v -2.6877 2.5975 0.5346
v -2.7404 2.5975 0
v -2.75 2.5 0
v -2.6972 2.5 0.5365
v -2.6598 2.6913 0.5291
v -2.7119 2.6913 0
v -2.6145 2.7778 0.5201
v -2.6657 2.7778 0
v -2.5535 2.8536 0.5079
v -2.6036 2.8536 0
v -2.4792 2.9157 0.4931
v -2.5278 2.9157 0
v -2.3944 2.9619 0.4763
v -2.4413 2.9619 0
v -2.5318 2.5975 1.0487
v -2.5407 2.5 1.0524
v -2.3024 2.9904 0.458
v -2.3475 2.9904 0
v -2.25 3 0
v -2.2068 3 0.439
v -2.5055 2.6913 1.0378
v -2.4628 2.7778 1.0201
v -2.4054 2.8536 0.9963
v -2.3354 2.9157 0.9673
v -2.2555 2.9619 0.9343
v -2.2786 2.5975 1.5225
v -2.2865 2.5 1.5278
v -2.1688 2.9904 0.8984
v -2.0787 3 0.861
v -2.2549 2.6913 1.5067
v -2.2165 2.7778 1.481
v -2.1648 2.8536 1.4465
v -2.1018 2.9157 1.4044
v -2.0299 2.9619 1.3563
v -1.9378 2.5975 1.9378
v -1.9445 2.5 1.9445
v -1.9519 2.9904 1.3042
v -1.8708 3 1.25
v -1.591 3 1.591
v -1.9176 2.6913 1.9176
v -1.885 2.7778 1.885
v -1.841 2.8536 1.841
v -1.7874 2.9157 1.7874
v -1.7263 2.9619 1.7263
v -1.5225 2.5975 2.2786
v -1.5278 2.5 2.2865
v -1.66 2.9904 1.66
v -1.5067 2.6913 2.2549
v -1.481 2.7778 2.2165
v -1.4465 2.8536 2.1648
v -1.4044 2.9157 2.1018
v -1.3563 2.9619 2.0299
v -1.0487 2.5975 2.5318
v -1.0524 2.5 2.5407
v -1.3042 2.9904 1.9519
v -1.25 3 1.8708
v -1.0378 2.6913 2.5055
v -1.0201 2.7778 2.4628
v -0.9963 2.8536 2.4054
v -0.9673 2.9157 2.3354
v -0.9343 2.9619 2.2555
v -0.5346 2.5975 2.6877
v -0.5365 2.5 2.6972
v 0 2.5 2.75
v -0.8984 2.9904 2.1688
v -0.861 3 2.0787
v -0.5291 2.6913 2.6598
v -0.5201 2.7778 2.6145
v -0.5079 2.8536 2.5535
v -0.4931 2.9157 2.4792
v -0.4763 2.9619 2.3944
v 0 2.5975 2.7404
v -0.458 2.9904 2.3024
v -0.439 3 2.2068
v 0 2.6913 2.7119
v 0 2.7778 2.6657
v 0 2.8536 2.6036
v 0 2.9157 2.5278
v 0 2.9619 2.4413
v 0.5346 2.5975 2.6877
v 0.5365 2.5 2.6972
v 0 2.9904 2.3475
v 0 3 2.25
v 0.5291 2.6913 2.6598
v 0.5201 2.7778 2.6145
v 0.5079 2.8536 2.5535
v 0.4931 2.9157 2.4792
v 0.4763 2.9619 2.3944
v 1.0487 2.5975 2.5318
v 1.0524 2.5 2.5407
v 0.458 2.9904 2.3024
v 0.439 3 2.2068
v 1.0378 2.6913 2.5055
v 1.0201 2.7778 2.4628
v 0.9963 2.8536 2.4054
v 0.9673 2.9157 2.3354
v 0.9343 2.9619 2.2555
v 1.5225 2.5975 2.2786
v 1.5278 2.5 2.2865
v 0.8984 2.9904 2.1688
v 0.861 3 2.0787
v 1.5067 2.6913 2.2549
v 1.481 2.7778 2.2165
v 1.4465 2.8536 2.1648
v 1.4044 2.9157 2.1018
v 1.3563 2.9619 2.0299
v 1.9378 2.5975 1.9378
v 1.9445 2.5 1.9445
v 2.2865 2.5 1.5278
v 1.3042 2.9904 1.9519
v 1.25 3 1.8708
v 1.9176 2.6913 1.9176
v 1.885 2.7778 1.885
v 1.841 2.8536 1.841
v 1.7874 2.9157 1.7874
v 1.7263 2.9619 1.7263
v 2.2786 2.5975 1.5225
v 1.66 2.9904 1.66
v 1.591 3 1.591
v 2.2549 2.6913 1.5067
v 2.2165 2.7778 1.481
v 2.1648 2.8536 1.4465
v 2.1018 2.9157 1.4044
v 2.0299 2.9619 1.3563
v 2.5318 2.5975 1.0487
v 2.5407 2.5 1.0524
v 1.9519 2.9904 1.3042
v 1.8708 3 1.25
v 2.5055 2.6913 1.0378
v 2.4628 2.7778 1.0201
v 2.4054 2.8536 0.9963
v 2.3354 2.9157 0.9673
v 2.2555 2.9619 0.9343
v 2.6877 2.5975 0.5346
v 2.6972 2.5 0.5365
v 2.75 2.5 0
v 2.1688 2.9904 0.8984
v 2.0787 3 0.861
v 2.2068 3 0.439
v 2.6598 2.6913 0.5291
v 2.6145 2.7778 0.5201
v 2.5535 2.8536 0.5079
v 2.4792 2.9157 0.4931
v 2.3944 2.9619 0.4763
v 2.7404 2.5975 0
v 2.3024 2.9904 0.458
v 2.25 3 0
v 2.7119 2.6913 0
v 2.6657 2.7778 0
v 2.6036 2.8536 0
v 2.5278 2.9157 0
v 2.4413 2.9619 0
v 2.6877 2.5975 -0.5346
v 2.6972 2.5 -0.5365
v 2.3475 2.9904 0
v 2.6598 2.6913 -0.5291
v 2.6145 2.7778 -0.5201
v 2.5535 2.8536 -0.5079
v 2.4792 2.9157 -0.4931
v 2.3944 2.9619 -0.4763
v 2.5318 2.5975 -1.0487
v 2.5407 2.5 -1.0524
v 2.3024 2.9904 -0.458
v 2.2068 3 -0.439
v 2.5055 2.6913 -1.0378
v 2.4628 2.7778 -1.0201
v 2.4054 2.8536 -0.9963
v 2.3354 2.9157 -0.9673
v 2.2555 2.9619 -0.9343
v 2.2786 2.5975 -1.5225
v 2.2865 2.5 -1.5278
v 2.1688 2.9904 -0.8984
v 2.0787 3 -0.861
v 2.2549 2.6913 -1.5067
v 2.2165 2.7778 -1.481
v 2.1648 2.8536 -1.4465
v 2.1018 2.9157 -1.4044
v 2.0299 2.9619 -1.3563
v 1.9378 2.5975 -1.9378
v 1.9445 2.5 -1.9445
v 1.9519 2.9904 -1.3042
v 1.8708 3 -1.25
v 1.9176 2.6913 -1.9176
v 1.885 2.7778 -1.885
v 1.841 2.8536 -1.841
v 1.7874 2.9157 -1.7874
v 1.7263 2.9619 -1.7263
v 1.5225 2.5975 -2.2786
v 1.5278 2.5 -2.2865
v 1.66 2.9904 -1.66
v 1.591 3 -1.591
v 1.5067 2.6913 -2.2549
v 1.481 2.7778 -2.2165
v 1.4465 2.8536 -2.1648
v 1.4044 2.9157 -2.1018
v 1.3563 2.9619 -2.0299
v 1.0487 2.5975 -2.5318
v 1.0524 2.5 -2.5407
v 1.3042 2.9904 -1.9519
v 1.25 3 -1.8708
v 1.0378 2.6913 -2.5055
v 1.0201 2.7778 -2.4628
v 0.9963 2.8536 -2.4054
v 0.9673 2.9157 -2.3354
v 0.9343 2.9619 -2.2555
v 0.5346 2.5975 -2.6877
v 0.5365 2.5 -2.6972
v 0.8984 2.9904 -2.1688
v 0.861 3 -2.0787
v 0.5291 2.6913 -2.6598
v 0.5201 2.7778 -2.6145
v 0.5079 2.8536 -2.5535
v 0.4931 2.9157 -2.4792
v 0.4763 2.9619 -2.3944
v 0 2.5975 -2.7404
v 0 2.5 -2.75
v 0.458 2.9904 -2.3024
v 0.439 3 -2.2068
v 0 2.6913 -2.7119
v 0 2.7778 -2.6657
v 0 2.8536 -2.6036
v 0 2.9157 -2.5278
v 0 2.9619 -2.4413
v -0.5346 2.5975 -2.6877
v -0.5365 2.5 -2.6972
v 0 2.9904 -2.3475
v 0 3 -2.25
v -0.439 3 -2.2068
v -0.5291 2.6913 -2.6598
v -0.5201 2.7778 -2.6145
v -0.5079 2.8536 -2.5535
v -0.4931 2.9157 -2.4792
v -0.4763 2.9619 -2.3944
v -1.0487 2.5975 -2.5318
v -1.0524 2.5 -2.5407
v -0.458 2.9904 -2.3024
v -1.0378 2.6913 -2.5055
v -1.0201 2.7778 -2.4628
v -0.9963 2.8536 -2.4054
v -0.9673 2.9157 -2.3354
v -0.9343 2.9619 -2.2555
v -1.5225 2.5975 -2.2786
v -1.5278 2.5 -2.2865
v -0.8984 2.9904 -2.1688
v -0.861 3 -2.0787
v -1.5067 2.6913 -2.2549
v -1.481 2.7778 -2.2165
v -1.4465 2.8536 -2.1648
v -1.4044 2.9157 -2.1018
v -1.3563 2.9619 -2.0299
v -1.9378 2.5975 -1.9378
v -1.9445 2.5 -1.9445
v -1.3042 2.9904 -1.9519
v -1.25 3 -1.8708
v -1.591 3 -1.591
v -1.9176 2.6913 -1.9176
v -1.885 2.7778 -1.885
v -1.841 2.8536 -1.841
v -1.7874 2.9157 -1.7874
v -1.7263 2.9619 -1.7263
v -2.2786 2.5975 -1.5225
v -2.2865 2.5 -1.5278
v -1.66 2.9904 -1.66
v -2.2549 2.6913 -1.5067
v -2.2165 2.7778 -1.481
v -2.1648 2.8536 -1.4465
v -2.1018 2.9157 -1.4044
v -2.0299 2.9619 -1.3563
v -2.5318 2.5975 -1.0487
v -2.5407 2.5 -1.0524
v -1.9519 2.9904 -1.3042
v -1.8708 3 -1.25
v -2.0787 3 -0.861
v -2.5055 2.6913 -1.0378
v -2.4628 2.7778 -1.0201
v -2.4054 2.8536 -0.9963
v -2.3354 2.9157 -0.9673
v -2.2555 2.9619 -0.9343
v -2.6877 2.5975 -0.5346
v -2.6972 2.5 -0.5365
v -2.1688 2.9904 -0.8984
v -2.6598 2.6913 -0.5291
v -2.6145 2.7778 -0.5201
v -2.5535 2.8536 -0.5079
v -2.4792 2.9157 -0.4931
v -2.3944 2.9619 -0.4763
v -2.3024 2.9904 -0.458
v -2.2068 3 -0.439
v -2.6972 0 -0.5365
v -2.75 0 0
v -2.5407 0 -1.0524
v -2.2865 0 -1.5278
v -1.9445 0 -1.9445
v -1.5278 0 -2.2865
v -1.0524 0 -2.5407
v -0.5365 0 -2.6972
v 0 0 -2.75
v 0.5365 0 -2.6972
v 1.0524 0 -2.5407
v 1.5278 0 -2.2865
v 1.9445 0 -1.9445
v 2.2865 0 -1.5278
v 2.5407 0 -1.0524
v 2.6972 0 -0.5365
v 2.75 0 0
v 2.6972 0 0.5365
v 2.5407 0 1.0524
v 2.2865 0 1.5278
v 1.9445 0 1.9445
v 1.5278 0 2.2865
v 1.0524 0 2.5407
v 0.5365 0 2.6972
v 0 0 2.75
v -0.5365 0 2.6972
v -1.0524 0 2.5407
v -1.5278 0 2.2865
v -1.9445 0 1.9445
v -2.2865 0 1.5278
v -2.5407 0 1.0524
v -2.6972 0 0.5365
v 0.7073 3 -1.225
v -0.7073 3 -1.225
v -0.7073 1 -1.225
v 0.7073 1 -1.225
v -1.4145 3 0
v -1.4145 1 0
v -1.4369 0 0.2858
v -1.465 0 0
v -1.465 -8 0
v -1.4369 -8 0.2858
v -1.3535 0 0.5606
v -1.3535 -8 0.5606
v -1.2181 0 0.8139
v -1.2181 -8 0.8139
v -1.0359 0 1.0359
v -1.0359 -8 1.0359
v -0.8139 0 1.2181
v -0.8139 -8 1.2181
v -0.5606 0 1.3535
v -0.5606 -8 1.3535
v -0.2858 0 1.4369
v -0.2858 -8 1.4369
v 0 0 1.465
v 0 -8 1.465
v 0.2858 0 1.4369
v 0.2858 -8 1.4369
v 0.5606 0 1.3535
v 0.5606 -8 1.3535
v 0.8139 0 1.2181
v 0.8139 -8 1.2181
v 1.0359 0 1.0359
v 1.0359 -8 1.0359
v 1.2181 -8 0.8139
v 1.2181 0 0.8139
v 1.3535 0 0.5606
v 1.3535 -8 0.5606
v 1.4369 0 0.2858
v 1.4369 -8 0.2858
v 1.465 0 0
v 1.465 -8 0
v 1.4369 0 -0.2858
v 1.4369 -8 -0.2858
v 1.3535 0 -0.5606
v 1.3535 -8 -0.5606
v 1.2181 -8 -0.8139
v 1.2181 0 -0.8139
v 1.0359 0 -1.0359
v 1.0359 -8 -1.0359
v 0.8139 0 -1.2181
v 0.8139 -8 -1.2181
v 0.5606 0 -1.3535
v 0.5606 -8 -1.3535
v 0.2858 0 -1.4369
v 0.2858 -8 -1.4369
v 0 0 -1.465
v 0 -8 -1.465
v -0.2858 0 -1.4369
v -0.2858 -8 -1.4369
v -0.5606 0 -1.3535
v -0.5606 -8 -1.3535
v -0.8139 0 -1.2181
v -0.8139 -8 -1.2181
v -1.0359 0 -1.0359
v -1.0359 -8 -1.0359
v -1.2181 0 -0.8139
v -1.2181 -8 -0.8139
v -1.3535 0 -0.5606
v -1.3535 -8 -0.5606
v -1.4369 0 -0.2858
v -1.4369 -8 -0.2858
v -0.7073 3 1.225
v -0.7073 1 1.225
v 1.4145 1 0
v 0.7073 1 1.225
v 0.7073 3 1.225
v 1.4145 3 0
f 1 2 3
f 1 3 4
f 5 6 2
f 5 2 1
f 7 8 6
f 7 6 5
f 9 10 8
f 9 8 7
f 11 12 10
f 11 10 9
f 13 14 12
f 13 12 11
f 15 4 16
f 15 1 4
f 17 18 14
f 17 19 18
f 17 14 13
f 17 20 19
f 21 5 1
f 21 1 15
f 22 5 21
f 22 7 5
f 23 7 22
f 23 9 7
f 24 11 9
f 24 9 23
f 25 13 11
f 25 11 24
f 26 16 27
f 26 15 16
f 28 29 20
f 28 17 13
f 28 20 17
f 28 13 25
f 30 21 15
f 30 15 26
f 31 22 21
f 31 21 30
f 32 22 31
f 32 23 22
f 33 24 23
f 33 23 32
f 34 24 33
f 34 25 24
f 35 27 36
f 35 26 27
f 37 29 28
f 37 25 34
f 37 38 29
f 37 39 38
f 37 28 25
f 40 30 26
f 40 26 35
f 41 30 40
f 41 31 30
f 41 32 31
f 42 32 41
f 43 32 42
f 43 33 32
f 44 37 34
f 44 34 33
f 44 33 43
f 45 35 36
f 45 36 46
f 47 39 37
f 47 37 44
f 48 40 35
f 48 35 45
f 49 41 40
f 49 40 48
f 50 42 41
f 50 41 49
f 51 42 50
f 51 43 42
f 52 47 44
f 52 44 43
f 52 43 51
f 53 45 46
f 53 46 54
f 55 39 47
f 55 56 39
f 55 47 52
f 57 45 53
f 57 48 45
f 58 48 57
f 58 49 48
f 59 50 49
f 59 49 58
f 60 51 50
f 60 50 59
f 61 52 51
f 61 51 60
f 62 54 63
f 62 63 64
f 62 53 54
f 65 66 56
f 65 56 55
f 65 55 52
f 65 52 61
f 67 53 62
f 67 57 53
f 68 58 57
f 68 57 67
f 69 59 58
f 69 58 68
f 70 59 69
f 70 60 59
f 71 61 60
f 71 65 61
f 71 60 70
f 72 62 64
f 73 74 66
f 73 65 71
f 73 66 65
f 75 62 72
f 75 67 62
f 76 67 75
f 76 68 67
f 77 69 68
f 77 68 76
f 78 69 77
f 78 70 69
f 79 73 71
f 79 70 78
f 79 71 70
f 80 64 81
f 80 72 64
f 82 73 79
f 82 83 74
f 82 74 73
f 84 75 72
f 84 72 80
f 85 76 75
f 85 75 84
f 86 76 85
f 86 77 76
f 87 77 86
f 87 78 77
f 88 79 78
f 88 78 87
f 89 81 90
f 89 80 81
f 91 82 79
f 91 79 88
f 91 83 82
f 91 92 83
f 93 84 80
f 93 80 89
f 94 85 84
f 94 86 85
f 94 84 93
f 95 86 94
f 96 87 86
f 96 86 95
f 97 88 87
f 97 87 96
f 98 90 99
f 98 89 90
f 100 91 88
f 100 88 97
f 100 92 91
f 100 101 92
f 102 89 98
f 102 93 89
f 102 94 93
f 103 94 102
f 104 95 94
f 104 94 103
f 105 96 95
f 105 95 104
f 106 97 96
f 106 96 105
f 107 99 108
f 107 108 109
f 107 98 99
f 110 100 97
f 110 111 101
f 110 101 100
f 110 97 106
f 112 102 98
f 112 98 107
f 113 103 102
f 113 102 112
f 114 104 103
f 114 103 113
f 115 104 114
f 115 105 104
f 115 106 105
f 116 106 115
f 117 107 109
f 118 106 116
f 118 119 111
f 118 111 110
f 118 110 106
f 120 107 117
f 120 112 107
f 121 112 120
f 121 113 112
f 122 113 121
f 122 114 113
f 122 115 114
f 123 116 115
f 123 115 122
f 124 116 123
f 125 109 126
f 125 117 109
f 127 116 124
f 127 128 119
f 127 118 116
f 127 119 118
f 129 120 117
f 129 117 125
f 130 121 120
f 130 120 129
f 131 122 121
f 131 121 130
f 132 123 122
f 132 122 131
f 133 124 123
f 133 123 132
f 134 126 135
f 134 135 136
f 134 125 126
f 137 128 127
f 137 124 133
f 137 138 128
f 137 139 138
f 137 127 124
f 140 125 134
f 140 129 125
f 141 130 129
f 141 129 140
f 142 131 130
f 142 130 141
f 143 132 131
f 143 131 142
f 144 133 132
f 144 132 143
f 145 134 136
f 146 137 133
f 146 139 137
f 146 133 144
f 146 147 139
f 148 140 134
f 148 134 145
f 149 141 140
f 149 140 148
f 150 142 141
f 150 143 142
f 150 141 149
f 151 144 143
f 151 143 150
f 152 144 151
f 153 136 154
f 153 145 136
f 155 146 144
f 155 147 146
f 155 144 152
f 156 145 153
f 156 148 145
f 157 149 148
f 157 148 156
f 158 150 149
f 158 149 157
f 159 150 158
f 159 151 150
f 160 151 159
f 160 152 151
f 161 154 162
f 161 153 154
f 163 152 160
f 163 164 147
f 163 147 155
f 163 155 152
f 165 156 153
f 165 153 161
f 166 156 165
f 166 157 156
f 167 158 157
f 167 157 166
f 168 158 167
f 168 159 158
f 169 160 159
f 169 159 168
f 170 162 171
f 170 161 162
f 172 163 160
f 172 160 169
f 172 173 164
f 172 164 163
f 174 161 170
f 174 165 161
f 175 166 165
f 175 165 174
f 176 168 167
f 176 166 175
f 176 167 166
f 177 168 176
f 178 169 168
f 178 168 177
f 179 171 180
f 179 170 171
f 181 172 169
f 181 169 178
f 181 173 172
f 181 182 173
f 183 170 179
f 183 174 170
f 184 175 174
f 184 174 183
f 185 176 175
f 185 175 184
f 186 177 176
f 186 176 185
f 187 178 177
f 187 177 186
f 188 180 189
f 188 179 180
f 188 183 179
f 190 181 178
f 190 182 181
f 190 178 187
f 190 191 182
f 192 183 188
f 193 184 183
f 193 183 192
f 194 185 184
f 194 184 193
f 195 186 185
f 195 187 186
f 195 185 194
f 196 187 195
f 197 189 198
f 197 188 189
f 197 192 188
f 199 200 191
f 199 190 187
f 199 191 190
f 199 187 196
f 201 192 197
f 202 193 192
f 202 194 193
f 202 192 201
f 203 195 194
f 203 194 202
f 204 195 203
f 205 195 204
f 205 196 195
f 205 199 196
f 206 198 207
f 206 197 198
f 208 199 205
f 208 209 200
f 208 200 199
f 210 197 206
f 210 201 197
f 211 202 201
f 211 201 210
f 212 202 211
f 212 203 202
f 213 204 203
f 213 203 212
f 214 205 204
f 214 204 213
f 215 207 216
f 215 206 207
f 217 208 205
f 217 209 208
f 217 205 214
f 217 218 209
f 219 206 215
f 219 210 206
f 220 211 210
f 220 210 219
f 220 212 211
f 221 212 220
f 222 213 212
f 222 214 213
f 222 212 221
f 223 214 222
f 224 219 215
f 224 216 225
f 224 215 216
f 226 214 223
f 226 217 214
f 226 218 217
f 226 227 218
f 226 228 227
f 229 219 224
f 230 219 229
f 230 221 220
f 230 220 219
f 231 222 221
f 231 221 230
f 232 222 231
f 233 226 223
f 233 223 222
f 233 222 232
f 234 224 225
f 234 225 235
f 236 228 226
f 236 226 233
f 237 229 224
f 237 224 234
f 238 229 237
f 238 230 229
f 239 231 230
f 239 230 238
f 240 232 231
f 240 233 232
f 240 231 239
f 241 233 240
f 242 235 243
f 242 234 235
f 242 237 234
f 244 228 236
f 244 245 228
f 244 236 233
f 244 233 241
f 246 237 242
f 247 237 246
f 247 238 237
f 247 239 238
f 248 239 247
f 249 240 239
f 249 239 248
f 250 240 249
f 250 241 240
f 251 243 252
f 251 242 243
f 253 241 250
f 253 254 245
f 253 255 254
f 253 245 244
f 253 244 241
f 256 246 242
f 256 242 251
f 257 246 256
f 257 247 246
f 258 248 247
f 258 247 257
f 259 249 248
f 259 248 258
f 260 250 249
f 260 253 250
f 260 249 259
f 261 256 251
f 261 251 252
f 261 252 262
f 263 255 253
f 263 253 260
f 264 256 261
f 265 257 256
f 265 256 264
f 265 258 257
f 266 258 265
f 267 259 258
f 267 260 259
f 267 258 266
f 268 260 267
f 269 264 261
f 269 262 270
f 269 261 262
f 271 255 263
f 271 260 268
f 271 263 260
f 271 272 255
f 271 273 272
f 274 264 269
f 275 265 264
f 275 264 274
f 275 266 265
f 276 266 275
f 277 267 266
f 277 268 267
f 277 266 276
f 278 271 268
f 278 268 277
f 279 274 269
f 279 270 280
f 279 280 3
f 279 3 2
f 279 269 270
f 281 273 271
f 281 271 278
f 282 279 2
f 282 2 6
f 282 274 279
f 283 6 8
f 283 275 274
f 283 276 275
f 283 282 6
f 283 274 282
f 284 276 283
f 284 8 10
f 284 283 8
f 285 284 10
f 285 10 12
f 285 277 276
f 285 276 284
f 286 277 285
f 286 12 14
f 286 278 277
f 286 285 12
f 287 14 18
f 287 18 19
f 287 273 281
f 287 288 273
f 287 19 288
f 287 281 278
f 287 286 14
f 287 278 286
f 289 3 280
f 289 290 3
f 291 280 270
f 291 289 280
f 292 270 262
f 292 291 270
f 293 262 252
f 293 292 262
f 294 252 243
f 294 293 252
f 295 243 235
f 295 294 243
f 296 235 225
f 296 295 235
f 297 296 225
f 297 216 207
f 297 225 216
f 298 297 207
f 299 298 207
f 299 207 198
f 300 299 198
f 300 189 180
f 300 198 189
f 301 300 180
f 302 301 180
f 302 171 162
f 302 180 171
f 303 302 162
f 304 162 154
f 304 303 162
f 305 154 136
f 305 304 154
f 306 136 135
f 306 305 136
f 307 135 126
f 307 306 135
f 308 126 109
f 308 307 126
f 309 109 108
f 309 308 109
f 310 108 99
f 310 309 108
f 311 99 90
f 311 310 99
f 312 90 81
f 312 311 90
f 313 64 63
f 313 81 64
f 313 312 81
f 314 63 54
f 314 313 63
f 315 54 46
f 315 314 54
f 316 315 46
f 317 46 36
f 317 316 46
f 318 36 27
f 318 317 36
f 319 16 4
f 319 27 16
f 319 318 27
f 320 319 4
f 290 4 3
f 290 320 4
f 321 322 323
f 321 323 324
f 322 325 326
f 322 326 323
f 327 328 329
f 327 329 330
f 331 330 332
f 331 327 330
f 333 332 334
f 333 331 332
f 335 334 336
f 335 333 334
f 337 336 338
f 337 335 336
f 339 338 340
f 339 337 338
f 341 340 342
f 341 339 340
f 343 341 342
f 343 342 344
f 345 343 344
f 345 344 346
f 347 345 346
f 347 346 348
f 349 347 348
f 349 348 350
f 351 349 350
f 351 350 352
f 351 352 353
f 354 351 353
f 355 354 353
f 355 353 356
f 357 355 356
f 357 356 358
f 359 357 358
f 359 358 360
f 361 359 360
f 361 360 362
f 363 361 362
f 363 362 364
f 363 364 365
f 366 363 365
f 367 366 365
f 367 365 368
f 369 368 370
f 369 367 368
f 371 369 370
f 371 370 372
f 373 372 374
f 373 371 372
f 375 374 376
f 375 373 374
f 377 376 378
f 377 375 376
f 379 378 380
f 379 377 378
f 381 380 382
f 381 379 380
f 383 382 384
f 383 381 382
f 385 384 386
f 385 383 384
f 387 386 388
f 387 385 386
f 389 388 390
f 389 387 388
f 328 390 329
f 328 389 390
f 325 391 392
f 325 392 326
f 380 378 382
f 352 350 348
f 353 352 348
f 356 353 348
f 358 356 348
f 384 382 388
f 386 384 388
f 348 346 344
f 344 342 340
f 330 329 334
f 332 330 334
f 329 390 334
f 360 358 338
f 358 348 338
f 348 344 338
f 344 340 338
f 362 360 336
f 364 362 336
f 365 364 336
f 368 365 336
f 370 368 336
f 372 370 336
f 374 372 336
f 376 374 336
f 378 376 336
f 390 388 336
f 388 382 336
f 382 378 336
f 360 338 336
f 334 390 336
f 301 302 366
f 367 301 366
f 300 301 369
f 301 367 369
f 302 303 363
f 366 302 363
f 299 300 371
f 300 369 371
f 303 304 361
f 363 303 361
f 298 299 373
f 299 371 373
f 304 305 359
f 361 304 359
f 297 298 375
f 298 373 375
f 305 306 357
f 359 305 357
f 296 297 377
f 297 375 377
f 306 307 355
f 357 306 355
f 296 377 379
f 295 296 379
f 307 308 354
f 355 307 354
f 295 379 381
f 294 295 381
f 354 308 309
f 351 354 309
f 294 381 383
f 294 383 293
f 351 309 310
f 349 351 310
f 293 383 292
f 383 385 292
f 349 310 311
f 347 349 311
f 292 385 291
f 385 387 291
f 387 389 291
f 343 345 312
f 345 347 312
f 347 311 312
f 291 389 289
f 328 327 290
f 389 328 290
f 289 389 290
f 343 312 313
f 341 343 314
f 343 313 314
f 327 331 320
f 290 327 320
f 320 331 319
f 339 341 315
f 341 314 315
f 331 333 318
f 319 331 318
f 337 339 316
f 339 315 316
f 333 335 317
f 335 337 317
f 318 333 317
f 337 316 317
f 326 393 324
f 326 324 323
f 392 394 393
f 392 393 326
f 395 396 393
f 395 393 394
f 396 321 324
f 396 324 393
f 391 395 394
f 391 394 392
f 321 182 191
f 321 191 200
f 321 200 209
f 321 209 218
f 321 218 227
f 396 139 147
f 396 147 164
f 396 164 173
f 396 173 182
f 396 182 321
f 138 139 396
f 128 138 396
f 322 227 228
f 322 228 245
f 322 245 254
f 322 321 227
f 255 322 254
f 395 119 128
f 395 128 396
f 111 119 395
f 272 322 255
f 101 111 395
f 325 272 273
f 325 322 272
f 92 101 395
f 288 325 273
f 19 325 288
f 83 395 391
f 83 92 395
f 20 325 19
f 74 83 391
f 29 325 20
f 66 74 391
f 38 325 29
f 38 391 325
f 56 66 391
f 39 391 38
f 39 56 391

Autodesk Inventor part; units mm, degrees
ref_plane "YZ Plane" through (0, 0, 0) normal (1, 0, 0) x (0, 1, 0)
ref_plane "XZ Plane" through (0, 0, 0) normal (0, 1, 0) x (-1, 0, 0)
ref_plane "XY Plane" through (0, 0, 0) normal (0, 0, 1) x (1, 0, 0)
sketch "Sketch1" plane through (0, 0, 0) normal (0, 1, 0) x (-1, 0, 0)
  circle A0 centre (0, 0) radius 1.465
  circle A1 centre (0, 0) radius 2.75
  line L0 (0.7073, -1.225) -> (-0.7073, -1.225)
  line L1 (-0.7073, -1.225) -> (-1.4145, 0)
  line L2 (-1.4145, 0) -> (-0.7073, 1.225)
  line L3 (-0.7073, 1.225) -> (0.7073, 1.225)
  line L4 (0.7073, 1.225) -> (1.4145, 0)
  line L5 (1.4145, 0) -> (0.7073, -1.225)
  dimension "d0" = 2.93
  dimension "d1" = 5.5
  dimension "d8" = 2.45
extrude "Extrusion1" add sketch "Sketch1" along normal blind 3 contours A0 | A1 | L0 L1 L2 L3 L4 L5
extrude "Extrusion2" add sketch "Sketch1" against normal blind 8 contours A0 | L0 L1 L2 L3 L4 L5
extrude "Extrusion3" cut sketch "Sketch1" against normal blind 2 from surface at 3 contours L0 L1 L2 L3 L4 L5
fillet "Fillet1" radius 0.5 1 edges at (2.75, 3, 0)
thread "Thread2" size "M3x0.5" class "6g" standard "ANSI Metric M Profile" full length
equation "\"d4\" = length"
equation "\"length\" = 8"
properties part number "M3x16"
